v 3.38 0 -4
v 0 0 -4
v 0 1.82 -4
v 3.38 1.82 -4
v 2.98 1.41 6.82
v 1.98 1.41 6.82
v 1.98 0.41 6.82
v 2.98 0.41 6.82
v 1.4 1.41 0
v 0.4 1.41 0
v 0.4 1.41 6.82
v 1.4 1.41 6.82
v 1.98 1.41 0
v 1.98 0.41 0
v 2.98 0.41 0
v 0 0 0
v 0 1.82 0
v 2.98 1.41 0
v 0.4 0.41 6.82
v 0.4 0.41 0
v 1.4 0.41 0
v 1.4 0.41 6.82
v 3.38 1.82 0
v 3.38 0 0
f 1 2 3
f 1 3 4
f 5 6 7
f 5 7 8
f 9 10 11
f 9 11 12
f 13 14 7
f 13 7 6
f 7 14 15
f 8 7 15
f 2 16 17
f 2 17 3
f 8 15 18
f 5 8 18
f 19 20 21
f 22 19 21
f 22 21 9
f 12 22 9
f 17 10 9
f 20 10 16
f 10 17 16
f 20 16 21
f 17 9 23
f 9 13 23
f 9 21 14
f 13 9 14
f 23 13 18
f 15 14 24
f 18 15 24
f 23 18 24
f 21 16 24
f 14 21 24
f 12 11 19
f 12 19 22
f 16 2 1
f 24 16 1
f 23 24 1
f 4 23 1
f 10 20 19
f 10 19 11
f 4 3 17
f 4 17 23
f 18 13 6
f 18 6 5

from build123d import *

# Parameters (mm, degrees)
SKETCH1_W           = 3.38
SKETCH1_H           = 4
BOSS_EXTRUDE1_DEPTH = 1.82
SKETCH2_W           = 1
SKETCH2_H           = 1
BOSS_EXTRUDE2_DEPTH = 6.82


with BuildPart() as part:
    # Sketch1 → Boss-Extrude1 (new body)
    with BuildSketch(Plane(origin=(0, 0, 0), x_dir=(1, 0, 0), z_dir=(0, 1, 0))):
        with Locations((1.69, 2)):
            Rectangle(SKETCH1_W, SKETCH1_H)
    extrude(amount=BOSS_EXTRUDE1_DEPTH)

    # Sketch2 → Boss-Extrude2 (add)
    with BuildSketch(Plane.XY):
        with Locations((0.9, 0.91)):
            Rectangle(SKETCH2_W, SKETCH2_H)
        with Locations((2.48, 0.91)):
            Rectangle(SKETCH2_W, SKETCH2_H)
    extrude(amount=BOSS_EXTRUDE2_DEPTH)


solid = part.part
